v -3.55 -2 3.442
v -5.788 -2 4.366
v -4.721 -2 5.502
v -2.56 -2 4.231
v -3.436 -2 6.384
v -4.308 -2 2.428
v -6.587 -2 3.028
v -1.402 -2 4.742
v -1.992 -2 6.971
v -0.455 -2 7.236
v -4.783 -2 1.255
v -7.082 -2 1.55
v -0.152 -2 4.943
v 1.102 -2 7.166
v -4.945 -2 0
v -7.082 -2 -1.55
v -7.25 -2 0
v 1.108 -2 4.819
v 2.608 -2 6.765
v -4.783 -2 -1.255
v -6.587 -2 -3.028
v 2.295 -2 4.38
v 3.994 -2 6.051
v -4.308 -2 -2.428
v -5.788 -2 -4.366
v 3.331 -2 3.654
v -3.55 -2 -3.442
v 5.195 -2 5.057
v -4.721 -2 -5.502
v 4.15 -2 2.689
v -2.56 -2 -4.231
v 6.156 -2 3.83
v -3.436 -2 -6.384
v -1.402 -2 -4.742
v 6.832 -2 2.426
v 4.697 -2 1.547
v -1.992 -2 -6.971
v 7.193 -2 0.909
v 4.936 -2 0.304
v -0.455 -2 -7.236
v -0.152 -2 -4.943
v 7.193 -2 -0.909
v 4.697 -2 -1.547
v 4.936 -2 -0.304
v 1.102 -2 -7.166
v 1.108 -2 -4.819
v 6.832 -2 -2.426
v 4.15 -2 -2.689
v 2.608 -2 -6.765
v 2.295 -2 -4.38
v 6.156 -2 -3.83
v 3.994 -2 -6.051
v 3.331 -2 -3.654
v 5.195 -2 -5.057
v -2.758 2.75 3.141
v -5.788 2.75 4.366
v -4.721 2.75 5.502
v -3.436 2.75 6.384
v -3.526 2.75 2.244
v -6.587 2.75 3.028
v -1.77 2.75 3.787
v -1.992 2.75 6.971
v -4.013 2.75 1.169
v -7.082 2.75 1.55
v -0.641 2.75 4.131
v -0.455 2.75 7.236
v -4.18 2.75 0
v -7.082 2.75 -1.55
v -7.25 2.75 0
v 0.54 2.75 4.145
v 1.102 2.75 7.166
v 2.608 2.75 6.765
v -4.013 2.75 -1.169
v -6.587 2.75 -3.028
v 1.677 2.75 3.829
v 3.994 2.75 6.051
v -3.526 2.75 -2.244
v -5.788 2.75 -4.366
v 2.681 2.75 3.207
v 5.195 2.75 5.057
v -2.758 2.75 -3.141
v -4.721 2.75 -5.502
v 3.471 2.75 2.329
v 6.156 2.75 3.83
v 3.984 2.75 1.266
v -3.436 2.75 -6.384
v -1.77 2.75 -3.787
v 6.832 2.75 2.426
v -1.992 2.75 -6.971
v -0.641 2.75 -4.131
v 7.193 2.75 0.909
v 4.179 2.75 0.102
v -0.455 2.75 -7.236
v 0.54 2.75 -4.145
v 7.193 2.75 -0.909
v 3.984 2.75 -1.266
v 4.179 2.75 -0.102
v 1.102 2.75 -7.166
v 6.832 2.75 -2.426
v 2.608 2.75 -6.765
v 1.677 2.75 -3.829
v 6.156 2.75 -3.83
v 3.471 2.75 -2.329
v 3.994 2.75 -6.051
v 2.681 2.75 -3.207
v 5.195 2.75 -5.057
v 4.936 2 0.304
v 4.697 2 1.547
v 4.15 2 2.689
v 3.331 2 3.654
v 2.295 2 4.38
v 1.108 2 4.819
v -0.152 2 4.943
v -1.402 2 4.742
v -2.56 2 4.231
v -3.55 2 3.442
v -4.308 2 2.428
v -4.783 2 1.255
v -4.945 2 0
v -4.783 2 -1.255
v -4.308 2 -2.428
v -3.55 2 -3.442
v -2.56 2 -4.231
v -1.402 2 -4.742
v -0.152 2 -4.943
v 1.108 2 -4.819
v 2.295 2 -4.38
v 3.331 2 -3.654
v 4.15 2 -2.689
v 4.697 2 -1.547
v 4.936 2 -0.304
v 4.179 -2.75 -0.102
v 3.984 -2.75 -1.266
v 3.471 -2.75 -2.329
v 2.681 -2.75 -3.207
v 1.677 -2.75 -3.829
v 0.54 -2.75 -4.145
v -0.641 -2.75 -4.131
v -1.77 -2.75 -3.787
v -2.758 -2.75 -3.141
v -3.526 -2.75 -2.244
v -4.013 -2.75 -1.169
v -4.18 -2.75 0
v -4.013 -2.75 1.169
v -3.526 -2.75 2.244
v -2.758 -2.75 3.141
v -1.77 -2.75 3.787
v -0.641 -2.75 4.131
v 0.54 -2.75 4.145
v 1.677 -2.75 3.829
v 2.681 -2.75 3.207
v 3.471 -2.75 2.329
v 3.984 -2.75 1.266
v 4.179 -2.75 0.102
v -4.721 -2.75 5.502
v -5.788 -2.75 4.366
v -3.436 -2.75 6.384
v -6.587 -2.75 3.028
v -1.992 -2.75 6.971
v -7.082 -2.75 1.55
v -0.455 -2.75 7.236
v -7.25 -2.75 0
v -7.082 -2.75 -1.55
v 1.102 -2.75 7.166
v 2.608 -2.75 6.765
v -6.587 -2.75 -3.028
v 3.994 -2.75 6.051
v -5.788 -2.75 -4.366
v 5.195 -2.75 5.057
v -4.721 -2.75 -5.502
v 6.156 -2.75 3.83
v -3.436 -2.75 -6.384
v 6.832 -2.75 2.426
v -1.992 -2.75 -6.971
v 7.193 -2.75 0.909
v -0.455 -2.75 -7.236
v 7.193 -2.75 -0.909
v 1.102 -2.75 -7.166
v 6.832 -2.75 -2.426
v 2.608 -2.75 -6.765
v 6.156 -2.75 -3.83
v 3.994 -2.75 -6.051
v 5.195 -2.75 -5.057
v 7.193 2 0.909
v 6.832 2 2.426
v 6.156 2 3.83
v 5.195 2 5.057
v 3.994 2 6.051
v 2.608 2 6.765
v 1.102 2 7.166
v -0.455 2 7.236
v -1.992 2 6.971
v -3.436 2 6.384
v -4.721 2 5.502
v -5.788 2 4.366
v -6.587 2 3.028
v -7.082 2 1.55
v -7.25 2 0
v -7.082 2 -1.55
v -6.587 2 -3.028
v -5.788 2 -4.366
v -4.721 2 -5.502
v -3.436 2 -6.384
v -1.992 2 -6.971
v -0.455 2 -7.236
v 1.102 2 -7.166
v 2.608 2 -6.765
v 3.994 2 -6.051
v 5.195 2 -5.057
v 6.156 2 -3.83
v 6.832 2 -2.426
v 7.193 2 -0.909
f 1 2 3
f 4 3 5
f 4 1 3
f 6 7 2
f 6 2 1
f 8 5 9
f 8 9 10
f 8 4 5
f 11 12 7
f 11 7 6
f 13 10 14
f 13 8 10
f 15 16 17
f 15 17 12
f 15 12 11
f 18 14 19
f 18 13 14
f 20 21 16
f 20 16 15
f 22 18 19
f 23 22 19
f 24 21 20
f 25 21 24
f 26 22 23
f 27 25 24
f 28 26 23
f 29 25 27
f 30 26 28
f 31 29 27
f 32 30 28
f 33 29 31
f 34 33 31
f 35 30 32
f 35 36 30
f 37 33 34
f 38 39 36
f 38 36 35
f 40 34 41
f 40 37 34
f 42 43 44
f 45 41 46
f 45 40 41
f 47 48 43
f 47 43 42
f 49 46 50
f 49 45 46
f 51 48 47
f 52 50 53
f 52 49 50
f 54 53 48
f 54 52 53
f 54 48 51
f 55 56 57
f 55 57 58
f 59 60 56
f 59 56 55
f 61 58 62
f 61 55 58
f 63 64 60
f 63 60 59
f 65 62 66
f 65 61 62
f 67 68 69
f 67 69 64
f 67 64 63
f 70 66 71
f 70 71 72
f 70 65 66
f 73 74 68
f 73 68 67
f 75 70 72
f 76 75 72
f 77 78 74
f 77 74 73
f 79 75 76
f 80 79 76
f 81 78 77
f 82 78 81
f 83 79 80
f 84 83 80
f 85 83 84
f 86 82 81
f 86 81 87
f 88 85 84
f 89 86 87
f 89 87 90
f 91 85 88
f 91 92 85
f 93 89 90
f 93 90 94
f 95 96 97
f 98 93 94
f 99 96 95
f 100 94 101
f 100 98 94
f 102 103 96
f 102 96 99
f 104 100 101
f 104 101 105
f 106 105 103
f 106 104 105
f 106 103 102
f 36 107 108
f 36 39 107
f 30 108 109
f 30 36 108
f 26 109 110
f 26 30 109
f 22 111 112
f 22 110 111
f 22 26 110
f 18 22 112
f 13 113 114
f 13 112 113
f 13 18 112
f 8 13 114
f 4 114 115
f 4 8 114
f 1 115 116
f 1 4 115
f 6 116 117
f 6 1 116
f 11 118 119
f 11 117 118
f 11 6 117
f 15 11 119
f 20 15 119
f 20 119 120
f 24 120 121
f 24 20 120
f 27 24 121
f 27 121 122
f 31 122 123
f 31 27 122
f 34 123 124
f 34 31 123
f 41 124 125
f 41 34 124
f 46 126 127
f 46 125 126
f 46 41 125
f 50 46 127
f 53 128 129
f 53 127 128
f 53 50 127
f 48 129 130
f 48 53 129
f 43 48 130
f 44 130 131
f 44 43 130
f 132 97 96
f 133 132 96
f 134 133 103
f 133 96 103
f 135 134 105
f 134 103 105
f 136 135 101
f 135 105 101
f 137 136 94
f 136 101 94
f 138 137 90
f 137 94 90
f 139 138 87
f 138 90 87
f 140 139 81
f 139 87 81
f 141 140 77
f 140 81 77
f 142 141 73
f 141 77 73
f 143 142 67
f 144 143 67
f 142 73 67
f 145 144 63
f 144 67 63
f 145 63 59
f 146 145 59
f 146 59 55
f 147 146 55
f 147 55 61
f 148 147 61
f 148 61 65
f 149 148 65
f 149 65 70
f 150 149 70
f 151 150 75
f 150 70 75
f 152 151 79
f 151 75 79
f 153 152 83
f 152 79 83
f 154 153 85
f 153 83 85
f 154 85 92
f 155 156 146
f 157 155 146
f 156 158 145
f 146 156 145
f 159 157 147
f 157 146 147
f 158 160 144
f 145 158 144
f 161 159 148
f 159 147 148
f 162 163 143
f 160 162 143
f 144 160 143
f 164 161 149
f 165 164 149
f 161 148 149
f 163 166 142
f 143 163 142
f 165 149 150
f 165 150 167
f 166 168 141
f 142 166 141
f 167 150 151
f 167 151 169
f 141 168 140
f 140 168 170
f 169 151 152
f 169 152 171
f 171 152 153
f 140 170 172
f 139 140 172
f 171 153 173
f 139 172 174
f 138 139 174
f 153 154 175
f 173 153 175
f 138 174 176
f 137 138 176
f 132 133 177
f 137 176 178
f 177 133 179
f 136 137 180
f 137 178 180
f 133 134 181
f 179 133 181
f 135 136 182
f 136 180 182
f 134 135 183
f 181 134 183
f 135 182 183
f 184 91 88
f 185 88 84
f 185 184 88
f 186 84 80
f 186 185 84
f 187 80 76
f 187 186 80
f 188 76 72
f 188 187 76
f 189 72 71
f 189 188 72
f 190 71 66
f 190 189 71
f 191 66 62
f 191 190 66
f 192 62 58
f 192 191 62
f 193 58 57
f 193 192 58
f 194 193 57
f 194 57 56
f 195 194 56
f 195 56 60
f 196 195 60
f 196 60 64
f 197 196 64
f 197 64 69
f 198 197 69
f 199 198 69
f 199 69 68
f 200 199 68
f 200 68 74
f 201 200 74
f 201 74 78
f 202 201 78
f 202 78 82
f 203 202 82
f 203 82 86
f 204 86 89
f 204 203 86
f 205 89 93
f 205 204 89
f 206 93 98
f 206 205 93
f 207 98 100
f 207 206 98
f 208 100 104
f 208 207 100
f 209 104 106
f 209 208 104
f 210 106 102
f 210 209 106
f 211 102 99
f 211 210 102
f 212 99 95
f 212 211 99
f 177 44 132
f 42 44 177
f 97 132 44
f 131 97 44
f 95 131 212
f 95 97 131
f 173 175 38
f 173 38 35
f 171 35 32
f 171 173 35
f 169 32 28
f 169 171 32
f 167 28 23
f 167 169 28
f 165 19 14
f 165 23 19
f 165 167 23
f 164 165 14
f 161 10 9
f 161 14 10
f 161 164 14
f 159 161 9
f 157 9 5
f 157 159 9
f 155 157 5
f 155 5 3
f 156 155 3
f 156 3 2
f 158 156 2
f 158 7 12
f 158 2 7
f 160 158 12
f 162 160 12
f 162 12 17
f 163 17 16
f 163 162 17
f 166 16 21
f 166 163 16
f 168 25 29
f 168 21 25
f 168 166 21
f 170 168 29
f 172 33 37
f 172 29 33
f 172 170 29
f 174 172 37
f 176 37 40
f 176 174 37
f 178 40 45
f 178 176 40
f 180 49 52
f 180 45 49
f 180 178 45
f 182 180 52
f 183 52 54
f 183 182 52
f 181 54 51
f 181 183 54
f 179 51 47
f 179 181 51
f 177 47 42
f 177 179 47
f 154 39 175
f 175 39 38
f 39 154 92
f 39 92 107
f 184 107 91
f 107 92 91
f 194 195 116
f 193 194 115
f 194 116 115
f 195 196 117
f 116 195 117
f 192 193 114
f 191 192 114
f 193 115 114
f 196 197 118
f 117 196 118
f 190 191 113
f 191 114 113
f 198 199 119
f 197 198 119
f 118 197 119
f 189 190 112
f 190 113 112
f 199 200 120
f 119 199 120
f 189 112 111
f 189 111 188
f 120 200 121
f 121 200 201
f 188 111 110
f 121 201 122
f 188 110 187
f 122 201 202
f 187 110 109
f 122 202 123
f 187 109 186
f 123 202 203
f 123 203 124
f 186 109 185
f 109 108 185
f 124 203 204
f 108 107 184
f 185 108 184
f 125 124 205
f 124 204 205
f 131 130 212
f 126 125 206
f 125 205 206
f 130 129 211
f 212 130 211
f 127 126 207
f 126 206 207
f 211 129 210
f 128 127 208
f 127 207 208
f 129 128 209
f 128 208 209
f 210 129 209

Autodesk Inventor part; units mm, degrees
ref_plane "YZ Plane" through (0, 0, 0) normal (1, 0, 0) x (0, 1, 0)
ref_plane "XZ Plane" through (0, 0, 0) normal (0, 1, 0) x (-1, 0, 0)
ref_plane "XY Plane" through (0, 0, 0) normal (0, 0, 1) x (1, 0, 0)
sketch "Sketch1" plane through (0, 0, 0) normal (0, 0, 1) x (1, 0, 0)
  line L0 (0, -3.85) -> (0, 3.85) projected
  line L1 (-1.45, 0) -> (8.7, 0) projected
  line L2 (4.18, -2.75) -> (4.18, 2.75)
  line L3 (4.18, 2.75) -> (7.25, 2.75)
  line L4 (7.25, 2.75) -> (7.25, 2)
  line L5 (7.25, 2) -> (4.945, 2)
  line L6 (4.945, 2) -> (4.945, -2)
  line L7 (4.945, -2) -> (7.25, -2)
  line L8 (7.25, -2) -> (7.25, -2.75)
  line L9 (7.25, -2.75) -> (4.18, -2.75)
  point P0 (0, 0)
  point P1 (4.945, 0)
  dimension "d0" = 8.36
  dimension "d1" = 9.89
  dimension "d2" = 14.5
  dimension "d3" = 0.75
  dimension "d4" = 4
  dimension "d5" = 0.75
revolve "Revolution1" add sketch "Sketch1" angle 360 about axis through (0, -10, 0) along (0, 1, 0)
sketch "Sketch3" plane through (0, 2.75, 0) normal (0, 1, 0) x (1, 0, 0)
  circle A0 centre (0, 0) radius 7.25 projected
  circle A1 centre (0, 0) radius 4.18 projected
  line L0 (-10.15, 0) -> (10.15, 0) projected
  line L1 (0, 10.15) -> (0, -10.15) projected
  line L2 (4.1788, 0.1015) -> (7.1928, 0.9091)
  line L3 (4.1788, -0.1015) -> (7.1928, -0.9091)
  arc A2 (4.1788, -0.1015) -> (4.1788, 0.1015) centre (0, 0) ccw
  arc A3 (7.1928, -0.9091) -> (7.1928, 0.9091) centre (0, 0) ccw
  dimension "d15" = 15
  dimension "d16" = 30
  dimension "d17" = 3.014
  dimension "d18" = 3.014
extrude "Extrusion2" cut sketch "Sketch3" against normal through all contours L0 A1 L2 A0 | A0 L3 A1 L0
equation "\"d3\" = d5"
properties part number "311-04" material "Brass, Soft Yellow"
